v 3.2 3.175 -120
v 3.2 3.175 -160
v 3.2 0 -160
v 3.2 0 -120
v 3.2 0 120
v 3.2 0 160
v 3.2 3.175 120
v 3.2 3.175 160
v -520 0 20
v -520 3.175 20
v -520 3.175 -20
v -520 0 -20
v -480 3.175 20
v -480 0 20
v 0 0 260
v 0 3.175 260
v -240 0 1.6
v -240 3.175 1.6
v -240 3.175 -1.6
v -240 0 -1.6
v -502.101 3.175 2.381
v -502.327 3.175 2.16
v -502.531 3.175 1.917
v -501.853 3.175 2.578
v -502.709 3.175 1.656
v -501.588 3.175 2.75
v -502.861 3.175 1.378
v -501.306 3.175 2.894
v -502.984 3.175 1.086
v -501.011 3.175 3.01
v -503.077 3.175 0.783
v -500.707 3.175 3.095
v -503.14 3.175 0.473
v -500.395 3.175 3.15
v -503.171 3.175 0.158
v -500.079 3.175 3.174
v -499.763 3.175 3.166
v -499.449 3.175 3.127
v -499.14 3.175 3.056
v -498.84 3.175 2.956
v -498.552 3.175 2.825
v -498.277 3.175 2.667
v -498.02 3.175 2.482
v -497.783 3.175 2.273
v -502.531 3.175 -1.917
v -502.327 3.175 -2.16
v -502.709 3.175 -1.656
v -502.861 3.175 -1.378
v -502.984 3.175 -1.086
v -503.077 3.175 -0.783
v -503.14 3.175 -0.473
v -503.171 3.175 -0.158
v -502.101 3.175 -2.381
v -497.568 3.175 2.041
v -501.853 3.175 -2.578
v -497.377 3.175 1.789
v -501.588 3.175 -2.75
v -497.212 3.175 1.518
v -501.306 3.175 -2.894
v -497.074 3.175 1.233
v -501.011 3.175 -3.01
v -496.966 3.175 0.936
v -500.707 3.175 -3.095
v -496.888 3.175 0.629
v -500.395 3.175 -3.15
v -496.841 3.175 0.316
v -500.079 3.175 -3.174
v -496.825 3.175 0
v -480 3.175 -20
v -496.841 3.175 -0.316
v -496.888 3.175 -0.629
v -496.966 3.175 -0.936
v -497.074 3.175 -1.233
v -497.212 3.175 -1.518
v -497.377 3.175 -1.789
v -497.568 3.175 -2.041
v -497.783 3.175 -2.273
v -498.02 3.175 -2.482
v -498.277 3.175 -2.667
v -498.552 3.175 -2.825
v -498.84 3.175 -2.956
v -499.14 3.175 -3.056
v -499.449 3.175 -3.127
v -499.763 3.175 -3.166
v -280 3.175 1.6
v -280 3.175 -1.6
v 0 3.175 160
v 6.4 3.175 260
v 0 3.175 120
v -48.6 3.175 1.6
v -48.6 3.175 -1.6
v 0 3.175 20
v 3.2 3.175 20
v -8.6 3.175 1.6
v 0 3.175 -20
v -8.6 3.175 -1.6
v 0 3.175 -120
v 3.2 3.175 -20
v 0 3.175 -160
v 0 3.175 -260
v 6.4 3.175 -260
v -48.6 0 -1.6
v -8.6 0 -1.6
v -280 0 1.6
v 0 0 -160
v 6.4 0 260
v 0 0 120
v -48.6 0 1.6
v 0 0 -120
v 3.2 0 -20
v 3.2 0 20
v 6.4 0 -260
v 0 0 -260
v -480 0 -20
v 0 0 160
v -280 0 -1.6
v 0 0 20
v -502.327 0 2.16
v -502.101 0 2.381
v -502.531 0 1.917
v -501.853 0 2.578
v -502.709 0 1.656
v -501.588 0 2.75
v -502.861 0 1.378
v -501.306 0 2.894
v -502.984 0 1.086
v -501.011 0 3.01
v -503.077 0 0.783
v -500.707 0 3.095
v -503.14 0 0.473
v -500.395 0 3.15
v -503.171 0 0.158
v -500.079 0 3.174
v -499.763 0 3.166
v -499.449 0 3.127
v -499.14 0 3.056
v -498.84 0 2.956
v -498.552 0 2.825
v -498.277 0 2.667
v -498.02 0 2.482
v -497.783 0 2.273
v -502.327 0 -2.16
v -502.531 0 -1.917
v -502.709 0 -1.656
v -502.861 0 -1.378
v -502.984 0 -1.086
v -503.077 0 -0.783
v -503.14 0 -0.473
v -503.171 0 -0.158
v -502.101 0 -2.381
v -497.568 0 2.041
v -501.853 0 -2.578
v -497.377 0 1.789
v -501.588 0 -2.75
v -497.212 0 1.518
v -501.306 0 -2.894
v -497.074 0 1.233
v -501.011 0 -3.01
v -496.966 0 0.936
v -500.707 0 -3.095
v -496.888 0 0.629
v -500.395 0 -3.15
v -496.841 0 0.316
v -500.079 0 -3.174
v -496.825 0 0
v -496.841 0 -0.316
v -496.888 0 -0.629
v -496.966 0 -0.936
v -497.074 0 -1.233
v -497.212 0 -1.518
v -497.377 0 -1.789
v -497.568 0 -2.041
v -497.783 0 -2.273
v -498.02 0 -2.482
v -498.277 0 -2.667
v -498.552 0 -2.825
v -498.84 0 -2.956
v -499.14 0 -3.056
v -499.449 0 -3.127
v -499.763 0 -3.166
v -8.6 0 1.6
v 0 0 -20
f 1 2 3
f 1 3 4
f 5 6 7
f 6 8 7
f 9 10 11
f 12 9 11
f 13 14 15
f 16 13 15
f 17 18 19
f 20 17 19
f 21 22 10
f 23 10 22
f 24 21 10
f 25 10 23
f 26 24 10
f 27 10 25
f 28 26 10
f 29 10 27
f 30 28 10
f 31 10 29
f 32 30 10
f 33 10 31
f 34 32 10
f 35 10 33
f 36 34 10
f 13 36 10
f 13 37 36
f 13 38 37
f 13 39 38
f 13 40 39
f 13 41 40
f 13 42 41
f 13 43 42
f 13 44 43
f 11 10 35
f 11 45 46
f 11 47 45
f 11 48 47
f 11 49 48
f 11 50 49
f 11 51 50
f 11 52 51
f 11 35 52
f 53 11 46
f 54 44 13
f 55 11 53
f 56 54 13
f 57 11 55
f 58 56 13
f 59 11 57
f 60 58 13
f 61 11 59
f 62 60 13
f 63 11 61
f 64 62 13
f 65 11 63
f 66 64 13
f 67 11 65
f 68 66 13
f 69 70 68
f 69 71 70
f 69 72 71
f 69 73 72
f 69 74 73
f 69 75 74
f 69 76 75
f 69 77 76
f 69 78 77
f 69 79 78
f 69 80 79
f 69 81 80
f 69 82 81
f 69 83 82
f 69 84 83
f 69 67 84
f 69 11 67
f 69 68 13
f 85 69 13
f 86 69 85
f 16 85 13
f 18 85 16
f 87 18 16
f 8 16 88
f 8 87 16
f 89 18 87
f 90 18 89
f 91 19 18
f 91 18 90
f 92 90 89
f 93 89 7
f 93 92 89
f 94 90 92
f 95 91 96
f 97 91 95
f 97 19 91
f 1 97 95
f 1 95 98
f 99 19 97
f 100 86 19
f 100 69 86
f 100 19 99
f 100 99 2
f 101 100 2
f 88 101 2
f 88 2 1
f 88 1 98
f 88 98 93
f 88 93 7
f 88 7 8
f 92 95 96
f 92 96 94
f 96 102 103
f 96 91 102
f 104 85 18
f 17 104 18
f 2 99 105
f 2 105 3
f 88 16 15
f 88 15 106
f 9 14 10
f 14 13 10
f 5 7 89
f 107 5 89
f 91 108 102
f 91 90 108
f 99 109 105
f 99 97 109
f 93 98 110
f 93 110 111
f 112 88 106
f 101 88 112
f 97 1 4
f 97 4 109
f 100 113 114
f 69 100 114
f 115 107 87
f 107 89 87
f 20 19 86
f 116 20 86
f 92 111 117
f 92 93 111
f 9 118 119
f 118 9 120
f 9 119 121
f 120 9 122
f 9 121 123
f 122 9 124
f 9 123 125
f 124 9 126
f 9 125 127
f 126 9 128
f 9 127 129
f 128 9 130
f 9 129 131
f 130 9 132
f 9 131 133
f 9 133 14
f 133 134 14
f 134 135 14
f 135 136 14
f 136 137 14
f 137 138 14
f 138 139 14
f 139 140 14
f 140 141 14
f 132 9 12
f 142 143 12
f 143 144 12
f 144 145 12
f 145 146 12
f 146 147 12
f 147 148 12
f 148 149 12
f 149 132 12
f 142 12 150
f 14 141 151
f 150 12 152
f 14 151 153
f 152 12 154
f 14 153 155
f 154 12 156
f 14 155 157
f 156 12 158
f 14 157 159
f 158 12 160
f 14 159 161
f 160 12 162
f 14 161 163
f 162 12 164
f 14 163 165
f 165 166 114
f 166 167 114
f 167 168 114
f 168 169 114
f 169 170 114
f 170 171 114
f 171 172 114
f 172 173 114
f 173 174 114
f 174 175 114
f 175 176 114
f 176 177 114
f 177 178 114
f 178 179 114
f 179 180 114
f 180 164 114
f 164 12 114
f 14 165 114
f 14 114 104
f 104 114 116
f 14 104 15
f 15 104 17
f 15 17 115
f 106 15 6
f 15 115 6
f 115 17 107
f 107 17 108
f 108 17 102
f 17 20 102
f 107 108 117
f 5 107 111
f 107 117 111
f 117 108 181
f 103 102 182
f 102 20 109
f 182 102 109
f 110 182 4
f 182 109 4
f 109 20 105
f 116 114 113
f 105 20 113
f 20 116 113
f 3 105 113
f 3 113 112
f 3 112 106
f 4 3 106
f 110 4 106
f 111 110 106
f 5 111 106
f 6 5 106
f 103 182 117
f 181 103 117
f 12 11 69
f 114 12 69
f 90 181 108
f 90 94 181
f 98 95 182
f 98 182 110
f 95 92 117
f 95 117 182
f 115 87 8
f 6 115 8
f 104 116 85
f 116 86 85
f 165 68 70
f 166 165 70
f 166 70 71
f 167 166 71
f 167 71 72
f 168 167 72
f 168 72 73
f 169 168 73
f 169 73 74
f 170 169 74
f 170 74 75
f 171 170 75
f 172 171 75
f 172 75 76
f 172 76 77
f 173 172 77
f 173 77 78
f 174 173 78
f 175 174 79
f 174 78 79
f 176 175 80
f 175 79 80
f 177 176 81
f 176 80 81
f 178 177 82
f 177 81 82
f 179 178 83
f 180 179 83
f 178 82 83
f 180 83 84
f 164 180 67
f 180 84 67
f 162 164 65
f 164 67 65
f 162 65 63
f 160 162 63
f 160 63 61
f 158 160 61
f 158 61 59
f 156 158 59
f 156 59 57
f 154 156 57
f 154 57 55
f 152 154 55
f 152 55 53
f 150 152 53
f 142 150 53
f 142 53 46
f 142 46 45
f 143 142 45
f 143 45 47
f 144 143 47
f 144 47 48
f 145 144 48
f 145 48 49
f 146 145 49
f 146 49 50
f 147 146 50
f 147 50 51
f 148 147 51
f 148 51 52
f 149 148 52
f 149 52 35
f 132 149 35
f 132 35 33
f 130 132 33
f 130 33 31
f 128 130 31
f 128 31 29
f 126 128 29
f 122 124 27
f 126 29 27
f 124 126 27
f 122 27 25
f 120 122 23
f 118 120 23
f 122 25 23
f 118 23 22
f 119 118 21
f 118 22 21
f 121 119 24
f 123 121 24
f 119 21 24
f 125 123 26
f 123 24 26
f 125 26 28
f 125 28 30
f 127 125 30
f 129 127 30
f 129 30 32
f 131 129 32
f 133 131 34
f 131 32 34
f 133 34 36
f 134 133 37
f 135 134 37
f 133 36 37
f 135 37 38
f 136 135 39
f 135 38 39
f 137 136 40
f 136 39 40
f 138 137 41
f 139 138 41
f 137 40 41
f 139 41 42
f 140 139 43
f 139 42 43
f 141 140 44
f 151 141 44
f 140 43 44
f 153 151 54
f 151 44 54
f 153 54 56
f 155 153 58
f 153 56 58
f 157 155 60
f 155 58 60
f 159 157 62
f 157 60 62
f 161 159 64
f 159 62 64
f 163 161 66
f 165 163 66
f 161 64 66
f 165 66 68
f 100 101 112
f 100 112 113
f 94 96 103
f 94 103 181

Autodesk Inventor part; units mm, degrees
ref_plane "YZ Plane" through (0, 0, 0) normal (1, 0, 0) x (0, 1, 0)
ref_plane "XZ Plane" through (0, 0, 0) normal (0, 1, 0) x (-1, 0, 0)
ref_plane "XY Plane" through (0, 0, 0) normal (0, 0, 1) x (1, 0, 0)
sketch "Sketch1" plane through (0, 0, 0) normal (0, 1, 0) x (-1, 0, 0)
  line L0 (0, 260) -> (0, -260)
  line L1 (520, 0) -> (0, 260)
  line L2 (0, -260) -> (520, 0)
  point P0 (0, 0)
  dimension "d1" = 260
  dimension "d2" = 520
extrude "Extrusion1" add sketch "Sketch1" along normal blind 3.175
sketch "Sketch2" plane through (0, 3.175, 0) normal (0, 1, 0) x (1, 0, 0)
  circle A0 centre (-500, 0) radius 3.175
  point P0 (0, 0)
  dimension "d6" = 6.35
extrude "Extrusion2" cut sketch "Sketch2" against normal blind 3.175
sketch "Sketch3" plane through (0, 3.175, 0) normal (0, 1, 0) x (1, 0, 0)
  circle A0 centre (-500, 0) radius 3.175 projected
  line L0 (-500, 0) -> (-480, 0)
  line L1 (-480, 0) -> (-480, -20)
  line L2 (-480, -20) -> (-480, 20)
  line L3 (0, 260) -> (-520, 0) projected
  line L4 (-480, 20) -> (-520, 0)
  line L5 (-520, 0) -> (-480, -20)
  line L6 (-520, 0) -> (0, -260) projected
  point P0 (0, 0)
extrude "Extrusion3" cut sketch "Sketch3" against normal blind 3.175
sketch "Sketch4" plane through (0, 3.175, 0) normal (0, 1, 0) x (1, 0, 0)
  line L0 (-480, -20) -> (-480, 20) projected
  line L1 (-480, -20) -> (-520, -20)
  line L2 (-520, -20) -> (-520, 20)
  line L3 (-520, 20) -> (-480, 20)
  point P0 (0, 0)
  dimension "d11" = 40
extrude "Extrusion4" add sketch "Sketch4" against normal blind 3.175
sketch "Sketch5" plane through (0, 3.175, 0) normal (0, 1, 0) x (1, 0, 0)
  circle A0 centre (-500, 0) radius 3.175
  point P0 (0, 0)
  dimension "d15" = 6.35
extrude "Extrusion5" cut sketch "Sketch5" against normal blind 3.175
sketch "Sketch6" plane through (0, 3.175, 0) normal (0, 1, 0) x (1, 0, 0)
  line L0 (-480, -20) -> (0, -260) projected
  line L1 (0, -260) -> (50, -260)
  line L2 (50, -260) -> (50, 260)
  line L3 (50, 260) -> (0, 260)
  line L4 (0, 260) -> (0, -260)
  point P0 (0, 0)
extrude "Extrusion6" add sketch "Sketch6" against normal blind 3.175
sketch "Sketch8" plane through (0, 3.175, 0) normal (0, 1, 0) x (1, 0, 0)
  line L0 (0, 260) -> (-480, 20) projected
  line L1 (-480, -20) -> (0, -260) projected
  line L2 (3.175, -20) -> (0, -20)
  line L3 (0, -20) -> (0, 20)
  line L4 (0, -20) -> (3.2, -20)
  line L5 (0, 20) -> (3.2, 20)
  line L6 (3.2, 20) -> (3.2, -20)
  line L7 (3.2, 160) -> (3.2, 120)
  line L8 (3.2, 120) -> (0, 120)
  line L9 (0, 120) -> (0, 160)
  line L10 (0, 160) -> (3.2, 160)
  line L11 (3.2, -160) -> (3.2, -120)
  line L12 (3.2, -120) -> (0, -120)
  line L13 (0, -120) -> (0, -160)
  line L14 (0, -160) -> (3.2, -160)
  point P0 (0, 0)
  dimension "d23" = 3.2
  dimension "d24" = 3.2
  dimension "d27" = 40
extrude "Extrusion7" cut sketch "Sketch8" against normal blind 10
sketch "Sketch9" plane through (0, 3.175, 0) normal (0, 1, 0) x (1, 0, 0)
  line L0 (3.2, -120) -> (3.2, -160) projected
  line L1 (6.4, -260) -> (6.4, 260)
  line L2 (0, 260) -> (50, 260) projected
  line L3 (6.4, 260) -> (50, 260)
  line L4 (50, 260) -> (50, -260)
  line L5 (50, -260) -> (6.4, -260)
  point P0 (0, 0)
extrude "Extrusion8" cut sketch "Sketch9" against normal blind 10
sketch "Sketch10" plane through (0, 3.175, 0) normal (0, 1, 0) x (1, 0, 0)
  line L0 (-520, 20) -> (-520, -20) projected
  line L1 (-240, 1.6) -> (-280, 1.6)
  line L2 (-280, 1.6) -> (-280, -1.6)
  line L3 (-280, -1.6) -> (-240, -1.6)
  line L4 (-240, -1.6) -> (-240, 1.6)
  point P0 (0, 0)
  dimension "d38" = 40
  dimension "d39" = 40
extrude "Extrusion9" cut sketch "Sketch10" against normal blind 10
sketch "Sketch11" plane through (0, 3.175, 0) normal (0, 1, 0) x (1, 0, 0)
  line L0 (6.4, 260) -> (6.4, -260) projected
  line L1 (-8.6, 1.6) -> (-8.6, -1.6)
  line L2 (-8.6, -1.6) -> (-48.6, -1.6)
  line L3 (-48.6, -1.6) -> (-48.6, 1.6)
  line L4 (-48.6, 1.6) -> (-8.6, 1.6)
  point P0 (0, 0)
  dimension "d44" = 40
extrude "Extrusion10" cut sketch "Sketch11" against normal blind 10
properties part number "Trebuchet V1 - Truss"
